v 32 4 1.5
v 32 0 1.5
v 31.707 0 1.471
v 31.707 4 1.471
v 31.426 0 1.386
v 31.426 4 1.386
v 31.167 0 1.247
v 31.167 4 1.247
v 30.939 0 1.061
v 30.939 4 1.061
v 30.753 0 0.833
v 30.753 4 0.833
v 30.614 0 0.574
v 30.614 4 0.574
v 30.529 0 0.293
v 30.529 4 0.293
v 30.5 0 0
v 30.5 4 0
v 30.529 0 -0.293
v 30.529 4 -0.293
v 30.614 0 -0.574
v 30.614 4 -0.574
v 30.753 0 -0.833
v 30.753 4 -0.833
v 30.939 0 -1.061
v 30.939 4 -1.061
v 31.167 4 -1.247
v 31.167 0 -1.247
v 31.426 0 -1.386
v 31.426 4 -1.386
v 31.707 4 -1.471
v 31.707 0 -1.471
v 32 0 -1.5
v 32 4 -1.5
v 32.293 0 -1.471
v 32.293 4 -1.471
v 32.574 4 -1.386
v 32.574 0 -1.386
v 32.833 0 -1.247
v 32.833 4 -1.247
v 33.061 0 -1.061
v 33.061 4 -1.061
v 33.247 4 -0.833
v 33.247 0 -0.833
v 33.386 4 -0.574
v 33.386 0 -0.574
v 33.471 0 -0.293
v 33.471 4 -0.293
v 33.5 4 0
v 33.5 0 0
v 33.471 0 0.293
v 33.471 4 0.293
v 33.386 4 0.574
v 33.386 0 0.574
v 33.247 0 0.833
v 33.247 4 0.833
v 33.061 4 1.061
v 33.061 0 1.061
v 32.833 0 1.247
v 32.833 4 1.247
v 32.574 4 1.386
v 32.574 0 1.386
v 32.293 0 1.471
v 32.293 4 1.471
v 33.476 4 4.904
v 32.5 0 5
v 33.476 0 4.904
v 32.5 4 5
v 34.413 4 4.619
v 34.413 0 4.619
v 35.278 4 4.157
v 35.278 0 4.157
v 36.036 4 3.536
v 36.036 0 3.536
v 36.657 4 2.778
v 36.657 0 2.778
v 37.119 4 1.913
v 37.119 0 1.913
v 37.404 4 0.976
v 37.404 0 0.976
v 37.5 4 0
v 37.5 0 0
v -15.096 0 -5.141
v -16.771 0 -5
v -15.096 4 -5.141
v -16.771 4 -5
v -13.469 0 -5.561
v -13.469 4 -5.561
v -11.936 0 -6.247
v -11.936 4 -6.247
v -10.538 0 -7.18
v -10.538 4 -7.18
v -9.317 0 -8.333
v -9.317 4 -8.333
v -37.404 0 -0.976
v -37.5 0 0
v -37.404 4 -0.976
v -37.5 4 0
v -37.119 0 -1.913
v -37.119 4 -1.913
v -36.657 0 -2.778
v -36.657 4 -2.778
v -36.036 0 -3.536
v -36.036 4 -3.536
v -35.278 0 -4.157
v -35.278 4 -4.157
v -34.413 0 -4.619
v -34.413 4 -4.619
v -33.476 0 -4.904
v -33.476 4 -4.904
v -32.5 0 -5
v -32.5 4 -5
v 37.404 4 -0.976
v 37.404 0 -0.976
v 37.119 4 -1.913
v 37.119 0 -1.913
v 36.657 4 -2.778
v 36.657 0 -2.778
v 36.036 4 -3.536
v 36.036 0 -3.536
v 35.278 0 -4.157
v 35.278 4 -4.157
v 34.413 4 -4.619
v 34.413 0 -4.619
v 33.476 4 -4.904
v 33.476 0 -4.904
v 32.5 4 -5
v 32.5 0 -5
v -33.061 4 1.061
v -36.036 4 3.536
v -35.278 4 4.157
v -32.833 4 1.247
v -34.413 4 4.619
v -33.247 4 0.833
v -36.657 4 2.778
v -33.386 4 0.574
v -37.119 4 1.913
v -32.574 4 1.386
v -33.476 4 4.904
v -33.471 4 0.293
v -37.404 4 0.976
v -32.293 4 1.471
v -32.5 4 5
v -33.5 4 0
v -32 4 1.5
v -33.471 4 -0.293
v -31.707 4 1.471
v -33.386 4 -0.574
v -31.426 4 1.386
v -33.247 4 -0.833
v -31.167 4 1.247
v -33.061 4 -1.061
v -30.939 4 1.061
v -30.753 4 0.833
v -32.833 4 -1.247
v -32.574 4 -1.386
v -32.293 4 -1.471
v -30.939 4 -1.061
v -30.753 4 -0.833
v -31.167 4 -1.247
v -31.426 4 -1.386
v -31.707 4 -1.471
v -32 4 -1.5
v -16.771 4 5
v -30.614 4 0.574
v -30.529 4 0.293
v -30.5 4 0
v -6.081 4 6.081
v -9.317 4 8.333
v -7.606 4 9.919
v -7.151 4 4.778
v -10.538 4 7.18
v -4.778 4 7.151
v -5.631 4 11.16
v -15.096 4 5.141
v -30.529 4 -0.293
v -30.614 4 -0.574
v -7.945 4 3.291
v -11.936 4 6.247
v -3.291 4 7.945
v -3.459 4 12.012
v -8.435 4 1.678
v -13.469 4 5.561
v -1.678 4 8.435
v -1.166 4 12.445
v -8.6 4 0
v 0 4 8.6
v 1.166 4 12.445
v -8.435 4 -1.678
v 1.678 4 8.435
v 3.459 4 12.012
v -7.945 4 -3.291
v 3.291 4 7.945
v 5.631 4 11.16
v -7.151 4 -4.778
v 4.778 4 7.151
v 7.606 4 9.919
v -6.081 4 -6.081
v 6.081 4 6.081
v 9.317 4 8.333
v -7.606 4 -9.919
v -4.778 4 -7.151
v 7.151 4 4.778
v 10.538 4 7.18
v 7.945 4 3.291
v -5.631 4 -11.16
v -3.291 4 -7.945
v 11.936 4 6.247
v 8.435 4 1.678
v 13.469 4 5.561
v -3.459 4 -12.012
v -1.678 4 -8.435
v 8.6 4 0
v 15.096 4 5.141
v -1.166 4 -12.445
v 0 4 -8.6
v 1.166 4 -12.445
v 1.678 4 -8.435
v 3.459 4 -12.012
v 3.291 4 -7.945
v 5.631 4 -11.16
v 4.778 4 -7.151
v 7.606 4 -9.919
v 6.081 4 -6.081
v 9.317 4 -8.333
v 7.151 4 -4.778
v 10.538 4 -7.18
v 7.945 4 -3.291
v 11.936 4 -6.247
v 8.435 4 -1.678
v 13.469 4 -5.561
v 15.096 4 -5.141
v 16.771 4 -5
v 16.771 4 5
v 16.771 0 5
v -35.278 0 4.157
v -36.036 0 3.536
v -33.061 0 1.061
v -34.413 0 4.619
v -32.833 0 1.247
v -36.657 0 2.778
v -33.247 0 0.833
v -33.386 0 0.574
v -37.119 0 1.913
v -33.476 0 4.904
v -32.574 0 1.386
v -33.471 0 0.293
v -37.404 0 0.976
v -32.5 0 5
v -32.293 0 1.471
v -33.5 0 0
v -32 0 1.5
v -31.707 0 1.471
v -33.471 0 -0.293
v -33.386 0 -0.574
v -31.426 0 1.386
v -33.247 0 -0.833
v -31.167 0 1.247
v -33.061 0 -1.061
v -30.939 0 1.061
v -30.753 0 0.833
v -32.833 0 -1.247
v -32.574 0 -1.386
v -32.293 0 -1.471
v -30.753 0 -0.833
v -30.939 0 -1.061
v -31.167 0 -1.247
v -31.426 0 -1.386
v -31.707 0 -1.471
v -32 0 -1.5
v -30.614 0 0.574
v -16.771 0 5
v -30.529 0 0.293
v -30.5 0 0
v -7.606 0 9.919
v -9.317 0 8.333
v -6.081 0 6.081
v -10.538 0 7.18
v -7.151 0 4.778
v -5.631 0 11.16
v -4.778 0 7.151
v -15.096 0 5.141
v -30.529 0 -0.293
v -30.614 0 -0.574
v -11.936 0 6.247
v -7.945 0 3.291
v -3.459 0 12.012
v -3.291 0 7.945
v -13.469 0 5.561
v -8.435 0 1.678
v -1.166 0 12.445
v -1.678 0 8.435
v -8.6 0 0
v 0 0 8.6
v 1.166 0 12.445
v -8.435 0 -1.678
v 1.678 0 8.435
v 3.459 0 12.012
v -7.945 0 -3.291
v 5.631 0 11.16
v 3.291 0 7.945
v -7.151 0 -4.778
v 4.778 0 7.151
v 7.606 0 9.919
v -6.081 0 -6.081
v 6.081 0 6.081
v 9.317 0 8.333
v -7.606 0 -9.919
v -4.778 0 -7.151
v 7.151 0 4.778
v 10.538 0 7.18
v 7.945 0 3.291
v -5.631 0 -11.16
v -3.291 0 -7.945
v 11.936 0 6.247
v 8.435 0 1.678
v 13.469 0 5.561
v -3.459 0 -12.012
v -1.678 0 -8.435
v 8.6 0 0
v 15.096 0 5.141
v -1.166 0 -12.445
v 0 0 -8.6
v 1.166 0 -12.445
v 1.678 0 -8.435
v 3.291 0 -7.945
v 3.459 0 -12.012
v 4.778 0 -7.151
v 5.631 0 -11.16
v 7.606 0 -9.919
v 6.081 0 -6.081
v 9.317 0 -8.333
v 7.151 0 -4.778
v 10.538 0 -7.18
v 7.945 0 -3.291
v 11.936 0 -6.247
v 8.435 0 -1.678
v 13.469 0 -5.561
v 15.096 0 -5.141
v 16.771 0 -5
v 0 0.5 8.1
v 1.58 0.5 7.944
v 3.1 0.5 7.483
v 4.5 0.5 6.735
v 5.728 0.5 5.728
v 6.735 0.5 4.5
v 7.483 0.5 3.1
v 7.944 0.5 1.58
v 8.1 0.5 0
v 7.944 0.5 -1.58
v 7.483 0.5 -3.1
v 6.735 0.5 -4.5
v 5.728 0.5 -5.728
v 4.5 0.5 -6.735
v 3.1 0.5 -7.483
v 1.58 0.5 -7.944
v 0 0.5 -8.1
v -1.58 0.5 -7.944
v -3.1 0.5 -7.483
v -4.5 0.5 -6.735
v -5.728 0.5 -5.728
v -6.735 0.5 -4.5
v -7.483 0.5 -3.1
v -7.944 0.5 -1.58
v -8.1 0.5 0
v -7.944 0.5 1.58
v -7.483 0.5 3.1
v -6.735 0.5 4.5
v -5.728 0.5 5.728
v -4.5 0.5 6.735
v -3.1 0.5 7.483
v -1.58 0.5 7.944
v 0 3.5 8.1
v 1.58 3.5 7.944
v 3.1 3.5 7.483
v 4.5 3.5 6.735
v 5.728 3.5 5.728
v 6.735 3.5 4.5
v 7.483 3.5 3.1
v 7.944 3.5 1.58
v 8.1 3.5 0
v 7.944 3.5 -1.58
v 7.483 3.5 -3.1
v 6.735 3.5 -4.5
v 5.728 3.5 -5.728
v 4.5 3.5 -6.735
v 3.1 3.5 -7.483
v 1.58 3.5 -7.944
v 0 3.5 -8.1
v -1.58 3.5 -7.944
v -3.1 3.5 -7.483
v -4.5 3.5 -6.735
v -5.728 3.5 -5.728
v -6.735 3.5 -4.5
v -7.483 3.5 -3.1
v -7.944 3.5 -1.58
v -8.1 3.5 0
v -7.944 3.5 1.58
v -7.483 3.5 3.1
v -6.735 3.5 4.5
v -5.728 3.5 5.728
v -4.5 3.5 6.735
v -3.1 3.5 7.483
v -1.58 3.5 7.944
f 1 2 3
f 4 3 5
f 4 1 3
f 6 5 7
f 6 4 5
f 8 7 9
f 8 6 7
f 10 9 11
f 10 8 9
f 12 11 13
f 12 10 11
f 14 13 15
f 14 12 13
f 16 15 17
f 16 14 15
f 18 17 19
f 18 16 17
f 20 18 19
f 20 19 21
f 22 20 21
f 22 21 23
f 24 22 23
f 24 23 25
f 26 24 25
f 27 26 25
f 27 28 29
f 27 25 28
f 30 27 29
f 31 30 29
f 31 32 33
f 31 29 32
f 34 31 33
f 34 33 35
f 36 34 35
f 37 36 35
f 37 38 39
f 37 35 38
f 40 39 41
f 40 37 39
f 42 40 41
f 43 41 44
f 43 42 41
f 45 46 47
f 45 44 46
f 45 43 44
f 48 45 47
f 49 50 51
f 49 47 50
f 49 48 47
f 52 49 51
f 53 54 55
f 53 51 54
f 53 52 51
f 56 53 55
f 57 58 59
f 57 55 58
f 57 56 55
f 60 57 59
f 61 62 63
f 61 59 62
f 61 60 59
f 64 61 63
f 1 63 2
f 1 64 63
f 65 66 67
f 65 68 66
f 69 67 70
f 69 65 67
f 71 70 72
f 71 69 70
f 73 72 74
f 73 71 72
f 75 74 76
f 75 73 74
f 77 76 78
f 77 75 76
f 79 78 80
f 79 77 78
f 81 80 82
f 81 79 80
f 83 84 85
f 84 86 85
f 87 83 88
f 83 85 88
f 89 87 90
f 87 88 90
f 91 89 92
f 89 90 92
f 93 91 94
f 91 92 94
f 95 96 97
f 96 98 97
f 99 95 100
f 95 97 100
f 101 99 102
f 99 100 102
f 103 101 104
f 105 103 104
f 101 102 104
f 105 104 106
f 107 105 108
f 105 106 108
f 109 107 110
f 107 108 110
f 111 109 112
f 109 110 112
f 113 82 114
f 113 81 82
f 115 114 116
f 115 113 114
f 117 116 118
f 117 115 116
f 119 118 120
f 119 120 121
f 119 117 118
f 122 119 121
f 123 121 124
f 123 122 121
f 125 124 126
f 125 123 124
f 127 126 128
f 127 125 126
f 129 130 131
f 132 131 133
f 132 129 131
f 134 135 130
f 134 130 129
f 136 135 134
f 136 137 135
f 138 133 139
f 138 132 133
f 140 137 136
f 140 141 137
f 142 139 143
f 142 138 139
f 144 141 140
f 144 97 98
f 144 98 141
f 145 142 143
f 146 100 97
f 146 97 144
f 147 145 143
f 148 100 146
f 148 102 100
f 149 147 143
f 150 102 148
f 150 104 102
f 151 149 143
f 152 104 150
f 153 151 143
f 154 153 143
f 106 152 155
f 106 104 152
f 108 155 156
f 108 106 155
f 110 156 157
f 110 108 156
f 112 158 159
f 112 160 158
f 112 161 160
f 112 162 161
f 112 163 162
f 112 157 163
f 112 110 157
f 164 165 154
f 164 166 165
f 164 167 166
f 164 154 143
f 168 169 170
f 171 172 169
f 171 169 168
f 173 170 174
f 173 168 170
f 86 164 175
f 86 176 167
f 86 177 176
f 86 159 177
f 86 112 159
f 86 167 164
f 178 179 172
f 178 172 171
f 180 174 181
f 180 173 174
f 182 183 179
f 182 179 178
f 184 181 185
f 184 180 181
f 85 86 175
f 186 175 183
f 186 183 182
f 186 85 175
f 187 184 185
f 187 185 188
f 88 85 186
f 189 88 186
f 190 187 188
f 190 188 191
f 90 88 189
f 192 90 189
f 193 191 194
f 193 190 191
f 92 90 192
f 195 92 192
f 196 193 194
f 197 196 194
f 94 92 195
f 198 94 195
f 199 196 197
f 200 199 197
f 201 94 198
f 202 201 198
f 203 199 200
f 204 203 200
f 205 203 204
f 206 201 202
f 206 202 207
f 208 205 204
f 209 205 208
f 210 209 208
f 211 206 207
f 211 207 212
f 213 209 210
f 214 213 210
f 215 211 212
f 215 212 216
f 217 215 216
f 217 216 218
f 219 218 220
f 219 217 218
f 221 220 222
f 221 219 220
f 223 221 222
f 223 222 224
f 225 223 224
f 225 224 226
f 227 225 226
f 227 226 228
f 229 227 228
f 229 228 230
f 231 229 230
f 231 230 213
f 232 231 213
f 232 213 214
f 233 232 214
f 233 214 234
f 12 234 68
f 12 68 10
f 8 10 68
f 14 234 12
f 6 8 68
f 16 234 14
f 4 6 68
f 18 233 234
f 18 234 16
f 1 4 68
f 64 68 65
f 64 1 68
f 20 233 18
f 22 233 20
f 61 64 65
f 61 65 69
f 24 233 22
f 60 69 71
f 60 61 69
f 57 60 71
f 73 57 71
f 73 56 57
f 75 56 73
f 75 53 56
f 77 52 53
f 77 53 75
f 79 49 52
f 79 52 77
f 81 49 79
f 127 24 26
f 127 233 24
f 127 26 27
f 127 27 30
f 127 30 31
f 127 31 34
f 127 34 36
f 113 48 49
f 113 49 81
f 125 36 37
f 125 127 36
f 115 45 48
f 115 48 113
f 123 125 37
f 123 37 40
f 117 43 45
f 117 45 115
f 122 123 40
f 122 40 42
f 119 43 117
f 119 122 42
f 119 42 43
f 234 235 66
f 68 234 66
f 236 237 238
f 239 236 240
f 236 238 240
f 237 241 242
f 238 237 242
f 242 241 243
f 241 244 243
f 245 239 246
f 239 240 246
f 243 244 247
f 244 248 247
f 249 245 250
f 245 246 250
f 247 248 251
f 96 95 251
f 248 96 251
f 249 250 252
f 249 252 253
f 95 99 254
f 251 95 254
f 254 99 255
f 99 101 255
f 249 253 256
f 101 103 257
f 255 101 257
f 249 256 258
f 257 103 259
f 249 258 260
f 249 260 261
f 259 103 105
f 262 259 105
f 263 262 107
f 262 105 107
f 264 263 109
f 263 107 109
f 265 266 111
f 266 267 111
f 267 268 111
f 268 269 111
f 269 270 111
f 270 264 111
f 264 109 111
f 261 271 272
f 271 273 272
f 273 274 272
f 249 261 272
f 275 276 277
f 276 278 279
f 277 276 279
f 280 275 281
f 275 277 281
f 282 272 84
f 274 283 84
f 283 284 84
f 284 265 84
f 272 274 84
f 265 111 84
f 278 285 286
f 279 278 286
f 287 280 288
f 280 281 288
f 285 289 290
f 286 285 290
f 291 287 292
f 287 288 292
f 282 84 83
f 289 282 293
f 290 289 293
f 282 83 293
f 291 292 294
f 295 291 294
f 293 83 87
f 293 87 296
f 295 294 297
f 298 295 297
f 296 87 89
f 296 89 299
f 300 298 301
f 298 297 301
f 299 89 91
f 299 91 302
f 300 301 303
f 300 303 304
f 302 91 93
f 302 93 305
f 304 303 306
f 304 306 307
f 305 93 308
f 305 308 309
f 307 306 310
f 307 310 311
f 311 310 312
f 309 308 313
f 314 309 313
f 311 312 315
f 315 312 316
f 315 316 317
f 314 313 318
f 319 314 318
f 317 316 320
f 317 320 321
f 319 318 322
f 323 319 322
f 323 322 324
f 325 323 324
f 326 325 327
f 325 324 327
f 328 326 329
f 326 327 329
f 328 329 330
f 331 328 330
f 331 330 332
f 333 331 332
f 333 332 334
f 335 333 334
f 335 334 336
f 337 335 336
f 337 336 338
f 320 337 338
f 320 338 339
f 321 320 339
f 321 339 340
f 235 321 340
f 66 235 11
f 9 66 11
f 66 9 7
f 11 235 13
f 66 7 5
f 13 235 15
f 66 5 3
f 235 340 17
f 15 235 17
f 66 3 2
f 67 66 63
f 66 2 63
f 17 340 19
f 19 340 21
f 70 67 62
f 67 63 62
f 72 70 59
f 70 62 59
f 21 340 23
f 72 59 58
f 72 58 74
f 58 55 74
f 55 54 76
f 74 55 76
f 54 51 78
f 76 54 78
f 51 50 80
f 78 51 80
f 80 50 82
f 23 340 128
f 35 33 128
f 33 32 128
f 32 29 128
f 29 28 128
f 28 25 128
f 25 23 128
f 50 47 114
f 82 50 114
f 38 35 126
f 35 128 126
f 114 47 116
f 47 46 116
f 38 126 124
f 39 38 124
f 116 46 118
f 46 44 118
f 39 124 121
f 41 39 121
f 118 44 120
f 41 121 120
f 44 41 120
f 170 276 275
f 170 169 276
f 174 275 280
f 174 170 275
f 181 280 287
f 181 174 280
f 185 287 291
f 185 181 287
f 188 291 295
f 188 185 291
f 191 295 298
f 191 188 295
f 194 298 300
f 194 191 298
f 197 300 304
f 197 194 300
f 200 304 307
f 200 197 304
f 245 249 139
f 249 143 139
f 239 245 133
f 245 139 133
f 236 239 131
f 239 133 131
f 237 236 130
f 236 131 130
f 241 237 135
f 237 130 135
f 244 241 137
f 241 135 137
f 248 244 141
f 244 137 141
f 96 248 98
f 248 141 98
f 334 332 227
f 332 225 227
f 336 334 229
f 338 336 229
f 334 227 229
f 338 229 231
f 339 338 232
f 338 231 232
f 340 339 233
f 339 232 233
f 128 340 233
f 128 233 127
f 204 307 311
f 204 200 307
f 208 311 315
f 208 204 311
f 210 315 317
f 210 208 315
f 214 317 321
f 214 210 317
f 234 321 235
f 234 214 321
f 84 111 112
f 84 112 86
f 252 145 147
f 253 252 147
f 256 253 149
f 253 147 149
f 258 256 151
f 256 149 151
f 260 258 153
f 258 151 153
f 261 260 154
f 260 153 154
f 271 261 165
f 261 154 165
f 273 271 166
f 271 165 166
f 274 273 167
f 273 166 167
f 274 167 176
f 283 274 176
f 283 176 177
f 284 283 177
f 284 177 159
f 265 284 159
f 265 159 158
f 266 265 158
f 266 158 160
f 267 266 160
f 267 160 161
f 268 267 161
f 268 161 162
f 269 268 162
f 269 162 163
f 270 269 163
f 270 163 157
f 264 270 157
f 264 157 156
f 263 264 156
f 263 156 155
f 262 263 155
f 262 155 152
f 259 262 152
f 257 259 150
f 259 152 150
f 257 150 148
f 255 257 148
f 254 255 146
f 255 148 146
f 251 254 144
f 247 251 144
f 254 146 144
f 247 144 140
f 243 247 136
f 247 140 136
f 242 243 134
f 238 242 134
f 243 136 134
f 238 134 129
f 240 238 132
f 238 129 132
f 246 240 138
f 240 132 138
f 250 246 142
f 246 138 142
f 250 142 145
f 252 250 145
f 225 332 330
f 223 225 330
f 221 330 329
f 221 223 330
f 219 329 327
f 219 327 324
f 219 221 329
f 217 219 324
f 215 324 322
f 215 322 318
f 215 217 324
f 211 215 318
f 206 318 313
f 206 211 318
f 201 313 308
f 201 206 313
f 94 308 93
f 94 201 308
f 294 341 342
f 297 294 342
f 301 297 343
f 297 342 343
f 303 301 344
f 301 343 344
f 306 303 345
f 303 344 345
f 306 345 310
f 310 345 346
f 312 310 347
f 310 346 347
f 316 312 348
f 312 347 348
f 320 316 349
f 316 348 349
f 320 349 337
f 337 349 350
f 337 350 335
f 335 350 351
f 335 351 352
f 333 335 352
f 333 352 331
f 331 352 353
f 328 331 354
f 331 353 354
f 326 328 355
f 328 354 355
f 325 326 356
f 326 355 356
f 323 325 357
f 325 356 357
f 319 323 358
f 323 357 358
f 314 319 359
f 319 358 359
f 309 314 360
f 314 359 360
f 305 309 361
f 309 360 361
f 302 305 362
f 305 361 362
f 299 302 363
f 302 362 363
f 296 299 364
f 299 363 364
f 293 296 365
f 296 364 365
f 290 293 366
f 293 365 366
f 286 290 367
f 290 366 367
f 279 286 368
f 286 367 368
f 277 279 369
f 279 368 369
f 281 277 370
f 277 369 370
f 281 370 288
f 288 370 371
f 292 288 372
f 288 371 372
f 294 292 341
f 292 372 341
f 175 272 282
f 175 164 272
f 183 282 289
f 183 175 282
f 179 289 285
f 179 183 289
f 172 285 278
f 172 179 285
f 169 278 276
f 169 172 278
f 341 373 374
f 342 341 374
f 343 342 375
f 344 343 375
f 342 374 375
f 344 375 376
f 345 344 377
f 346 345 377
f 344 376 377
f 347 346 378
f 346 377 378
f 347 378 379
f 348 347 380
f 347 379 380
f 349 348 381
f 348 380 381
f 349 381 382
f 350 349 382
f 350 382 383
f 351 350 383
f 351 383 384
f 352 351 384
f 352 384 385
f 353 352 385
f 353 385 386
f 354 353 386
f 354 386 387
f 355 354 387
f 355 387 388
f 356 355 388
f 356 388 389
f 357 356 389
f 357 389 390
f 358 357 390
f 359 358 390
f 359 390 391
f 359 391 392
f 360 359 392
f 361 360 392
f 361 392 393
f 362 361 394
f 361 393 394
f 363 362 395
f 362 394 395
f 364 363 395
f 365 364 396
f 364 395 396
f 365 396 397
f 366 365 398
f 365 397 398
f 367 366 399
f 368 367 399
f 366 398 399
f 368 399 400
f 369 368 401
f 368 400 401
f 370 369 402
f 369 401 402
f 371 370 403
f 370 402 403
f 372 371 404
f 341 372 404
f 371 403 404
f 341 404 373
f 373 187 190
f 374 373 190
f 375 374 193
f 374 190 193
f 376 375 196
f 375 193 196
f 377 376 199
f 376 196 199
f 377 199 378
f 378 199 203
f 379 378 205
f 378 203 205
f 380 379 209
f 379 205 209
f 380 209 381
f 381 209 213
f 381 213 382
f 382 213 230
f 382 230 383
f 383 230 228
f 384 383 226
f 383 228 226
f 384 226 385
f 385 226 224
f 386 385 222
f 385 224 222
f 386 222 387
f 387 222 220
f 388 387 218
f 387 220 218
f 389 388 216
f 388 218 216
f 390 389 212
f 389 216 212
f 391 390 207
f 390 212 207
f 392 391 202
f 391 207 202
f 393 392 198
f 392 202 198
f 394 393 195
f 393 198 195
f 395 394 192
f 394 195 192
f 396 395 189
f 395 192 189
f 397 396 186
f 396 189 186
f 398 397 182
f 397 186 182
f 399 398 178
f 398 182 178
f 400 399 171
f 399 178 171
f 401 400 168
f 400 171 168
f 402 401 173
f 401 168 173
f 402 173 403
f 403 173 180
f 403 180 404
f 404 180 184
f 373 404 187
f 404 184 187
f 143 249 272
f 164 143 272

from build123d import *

# Parameters (mm, degrees)
SKETCH1_W           = 75
SKETCH1_H           = 10
BOSS_EXTRUDE1_DEPTH = 4
SKETCH7_R           = 12.5
BOSS_EXTRUDE2_DEPTH = 4
SKETCH4_R           = 8.1
CUT_EXTRUDE3_DEPTH  = 40.730341051
FILLET2_R           = 10
SKETCH8_R           = 1.5
CUT_EXTRUDE4_DEPTH  = 40.730341051
FILLET3_R           = 5
CHAMFER1_SIZE       = 0.5


with BuildPart() as part:
    # Sketch1 → Boss-Extrude1 (new body)
    with BuildSketch(Plane(origin=(0, 0, 0), x_dir=(1, 0, 0), z_dir=(0, 1, 0))):
        Rectangle(SKETCH1_W, SKETCH1_H)
    extrude(amount=BOSS_EXTRUDE1_DEPTH)

    # Sketch7 → Boss-Extrude2 (add)
    with BuildSketch(Plane(origin=(0, 4, 0), x_dir=(1, 0, 0), z_dir=(0, 1, 0))):
        Circle(SKETCH7_R)
    extrude(amount=-BOSS_EXTRUDE2_DEPTH)

    # Sketch4 → Cut-Extrude3 (cut, through all)
    with BuildSketch(Plane(origin=(0, 4, 0), x_dir=(1, 0, 0), z_dir=(0, 1, 0))):
        with Locations(Location((0, 0, 0), (0, 0, 270))):
            Circle(SKETCH4_R)
    extrude(amount=-CUT_EXTRUDE3_DEPTH, mode=Mode.SUBTRACT)

    # Fillet2
    fillet2_edges = [part.edges().sort_by_distance(p)[0] for p in [
        (11.456439237, 2, -5),
        (11.456439237, 2, 5),
        (-11.456439237, 2, -5),
        (-11.456439237, 2, 5),
    ]]
    fillet(fillet2_edges, radius=FILLET2_R)

    # Sketch8 → Cut-Extrude4 (cut, through all)
    with BuildSketch(Plane(origin=(0, 4, 0), x_dir=(1, 0, 0), z_dir=(0, 1, 0))):
        with Locations(Location((-32, 0, 0), (0, 0, 270))):
            Circle(SKETCH8_R)
    cut_extrude4 = extrude(amount=-CUT_EXTRUDE4_DEPTH, mode=Mode.SUBTRACT)

    # Mirror2: Cut-Extrude4 across plane
    add(cut_extrude4.mirror(Plane(origin=(0, 0, 0), x_dir=(0, 0, 1), z_dir=(1, 0, 0))), mode=Mode.SUBTRACT)

    # Fillet3
    fillet3_edges = [part.edges().sort_by_distance(p)[0] for p in [
        (-37.5, 2, -5),
        (-37.5, 2, 5),
        (37.5, 2, 5),
        (37.5, 2, -5),
    ]]
    fillet(fillet3_edges, radius=FILLET3_R - 0.0001)  # a hair under: the kernel refuses the full size

    # Chamfer1
    chamfer1_edges = [part.edges().sort_by_distance(p)[0] for p in [
        (0, 0, -8.1),
        (0, 4, -8.1),
    ]]
    chamfer(chamfer1_edges, length=CHAMFER1_SIZE)


solid = part.part
